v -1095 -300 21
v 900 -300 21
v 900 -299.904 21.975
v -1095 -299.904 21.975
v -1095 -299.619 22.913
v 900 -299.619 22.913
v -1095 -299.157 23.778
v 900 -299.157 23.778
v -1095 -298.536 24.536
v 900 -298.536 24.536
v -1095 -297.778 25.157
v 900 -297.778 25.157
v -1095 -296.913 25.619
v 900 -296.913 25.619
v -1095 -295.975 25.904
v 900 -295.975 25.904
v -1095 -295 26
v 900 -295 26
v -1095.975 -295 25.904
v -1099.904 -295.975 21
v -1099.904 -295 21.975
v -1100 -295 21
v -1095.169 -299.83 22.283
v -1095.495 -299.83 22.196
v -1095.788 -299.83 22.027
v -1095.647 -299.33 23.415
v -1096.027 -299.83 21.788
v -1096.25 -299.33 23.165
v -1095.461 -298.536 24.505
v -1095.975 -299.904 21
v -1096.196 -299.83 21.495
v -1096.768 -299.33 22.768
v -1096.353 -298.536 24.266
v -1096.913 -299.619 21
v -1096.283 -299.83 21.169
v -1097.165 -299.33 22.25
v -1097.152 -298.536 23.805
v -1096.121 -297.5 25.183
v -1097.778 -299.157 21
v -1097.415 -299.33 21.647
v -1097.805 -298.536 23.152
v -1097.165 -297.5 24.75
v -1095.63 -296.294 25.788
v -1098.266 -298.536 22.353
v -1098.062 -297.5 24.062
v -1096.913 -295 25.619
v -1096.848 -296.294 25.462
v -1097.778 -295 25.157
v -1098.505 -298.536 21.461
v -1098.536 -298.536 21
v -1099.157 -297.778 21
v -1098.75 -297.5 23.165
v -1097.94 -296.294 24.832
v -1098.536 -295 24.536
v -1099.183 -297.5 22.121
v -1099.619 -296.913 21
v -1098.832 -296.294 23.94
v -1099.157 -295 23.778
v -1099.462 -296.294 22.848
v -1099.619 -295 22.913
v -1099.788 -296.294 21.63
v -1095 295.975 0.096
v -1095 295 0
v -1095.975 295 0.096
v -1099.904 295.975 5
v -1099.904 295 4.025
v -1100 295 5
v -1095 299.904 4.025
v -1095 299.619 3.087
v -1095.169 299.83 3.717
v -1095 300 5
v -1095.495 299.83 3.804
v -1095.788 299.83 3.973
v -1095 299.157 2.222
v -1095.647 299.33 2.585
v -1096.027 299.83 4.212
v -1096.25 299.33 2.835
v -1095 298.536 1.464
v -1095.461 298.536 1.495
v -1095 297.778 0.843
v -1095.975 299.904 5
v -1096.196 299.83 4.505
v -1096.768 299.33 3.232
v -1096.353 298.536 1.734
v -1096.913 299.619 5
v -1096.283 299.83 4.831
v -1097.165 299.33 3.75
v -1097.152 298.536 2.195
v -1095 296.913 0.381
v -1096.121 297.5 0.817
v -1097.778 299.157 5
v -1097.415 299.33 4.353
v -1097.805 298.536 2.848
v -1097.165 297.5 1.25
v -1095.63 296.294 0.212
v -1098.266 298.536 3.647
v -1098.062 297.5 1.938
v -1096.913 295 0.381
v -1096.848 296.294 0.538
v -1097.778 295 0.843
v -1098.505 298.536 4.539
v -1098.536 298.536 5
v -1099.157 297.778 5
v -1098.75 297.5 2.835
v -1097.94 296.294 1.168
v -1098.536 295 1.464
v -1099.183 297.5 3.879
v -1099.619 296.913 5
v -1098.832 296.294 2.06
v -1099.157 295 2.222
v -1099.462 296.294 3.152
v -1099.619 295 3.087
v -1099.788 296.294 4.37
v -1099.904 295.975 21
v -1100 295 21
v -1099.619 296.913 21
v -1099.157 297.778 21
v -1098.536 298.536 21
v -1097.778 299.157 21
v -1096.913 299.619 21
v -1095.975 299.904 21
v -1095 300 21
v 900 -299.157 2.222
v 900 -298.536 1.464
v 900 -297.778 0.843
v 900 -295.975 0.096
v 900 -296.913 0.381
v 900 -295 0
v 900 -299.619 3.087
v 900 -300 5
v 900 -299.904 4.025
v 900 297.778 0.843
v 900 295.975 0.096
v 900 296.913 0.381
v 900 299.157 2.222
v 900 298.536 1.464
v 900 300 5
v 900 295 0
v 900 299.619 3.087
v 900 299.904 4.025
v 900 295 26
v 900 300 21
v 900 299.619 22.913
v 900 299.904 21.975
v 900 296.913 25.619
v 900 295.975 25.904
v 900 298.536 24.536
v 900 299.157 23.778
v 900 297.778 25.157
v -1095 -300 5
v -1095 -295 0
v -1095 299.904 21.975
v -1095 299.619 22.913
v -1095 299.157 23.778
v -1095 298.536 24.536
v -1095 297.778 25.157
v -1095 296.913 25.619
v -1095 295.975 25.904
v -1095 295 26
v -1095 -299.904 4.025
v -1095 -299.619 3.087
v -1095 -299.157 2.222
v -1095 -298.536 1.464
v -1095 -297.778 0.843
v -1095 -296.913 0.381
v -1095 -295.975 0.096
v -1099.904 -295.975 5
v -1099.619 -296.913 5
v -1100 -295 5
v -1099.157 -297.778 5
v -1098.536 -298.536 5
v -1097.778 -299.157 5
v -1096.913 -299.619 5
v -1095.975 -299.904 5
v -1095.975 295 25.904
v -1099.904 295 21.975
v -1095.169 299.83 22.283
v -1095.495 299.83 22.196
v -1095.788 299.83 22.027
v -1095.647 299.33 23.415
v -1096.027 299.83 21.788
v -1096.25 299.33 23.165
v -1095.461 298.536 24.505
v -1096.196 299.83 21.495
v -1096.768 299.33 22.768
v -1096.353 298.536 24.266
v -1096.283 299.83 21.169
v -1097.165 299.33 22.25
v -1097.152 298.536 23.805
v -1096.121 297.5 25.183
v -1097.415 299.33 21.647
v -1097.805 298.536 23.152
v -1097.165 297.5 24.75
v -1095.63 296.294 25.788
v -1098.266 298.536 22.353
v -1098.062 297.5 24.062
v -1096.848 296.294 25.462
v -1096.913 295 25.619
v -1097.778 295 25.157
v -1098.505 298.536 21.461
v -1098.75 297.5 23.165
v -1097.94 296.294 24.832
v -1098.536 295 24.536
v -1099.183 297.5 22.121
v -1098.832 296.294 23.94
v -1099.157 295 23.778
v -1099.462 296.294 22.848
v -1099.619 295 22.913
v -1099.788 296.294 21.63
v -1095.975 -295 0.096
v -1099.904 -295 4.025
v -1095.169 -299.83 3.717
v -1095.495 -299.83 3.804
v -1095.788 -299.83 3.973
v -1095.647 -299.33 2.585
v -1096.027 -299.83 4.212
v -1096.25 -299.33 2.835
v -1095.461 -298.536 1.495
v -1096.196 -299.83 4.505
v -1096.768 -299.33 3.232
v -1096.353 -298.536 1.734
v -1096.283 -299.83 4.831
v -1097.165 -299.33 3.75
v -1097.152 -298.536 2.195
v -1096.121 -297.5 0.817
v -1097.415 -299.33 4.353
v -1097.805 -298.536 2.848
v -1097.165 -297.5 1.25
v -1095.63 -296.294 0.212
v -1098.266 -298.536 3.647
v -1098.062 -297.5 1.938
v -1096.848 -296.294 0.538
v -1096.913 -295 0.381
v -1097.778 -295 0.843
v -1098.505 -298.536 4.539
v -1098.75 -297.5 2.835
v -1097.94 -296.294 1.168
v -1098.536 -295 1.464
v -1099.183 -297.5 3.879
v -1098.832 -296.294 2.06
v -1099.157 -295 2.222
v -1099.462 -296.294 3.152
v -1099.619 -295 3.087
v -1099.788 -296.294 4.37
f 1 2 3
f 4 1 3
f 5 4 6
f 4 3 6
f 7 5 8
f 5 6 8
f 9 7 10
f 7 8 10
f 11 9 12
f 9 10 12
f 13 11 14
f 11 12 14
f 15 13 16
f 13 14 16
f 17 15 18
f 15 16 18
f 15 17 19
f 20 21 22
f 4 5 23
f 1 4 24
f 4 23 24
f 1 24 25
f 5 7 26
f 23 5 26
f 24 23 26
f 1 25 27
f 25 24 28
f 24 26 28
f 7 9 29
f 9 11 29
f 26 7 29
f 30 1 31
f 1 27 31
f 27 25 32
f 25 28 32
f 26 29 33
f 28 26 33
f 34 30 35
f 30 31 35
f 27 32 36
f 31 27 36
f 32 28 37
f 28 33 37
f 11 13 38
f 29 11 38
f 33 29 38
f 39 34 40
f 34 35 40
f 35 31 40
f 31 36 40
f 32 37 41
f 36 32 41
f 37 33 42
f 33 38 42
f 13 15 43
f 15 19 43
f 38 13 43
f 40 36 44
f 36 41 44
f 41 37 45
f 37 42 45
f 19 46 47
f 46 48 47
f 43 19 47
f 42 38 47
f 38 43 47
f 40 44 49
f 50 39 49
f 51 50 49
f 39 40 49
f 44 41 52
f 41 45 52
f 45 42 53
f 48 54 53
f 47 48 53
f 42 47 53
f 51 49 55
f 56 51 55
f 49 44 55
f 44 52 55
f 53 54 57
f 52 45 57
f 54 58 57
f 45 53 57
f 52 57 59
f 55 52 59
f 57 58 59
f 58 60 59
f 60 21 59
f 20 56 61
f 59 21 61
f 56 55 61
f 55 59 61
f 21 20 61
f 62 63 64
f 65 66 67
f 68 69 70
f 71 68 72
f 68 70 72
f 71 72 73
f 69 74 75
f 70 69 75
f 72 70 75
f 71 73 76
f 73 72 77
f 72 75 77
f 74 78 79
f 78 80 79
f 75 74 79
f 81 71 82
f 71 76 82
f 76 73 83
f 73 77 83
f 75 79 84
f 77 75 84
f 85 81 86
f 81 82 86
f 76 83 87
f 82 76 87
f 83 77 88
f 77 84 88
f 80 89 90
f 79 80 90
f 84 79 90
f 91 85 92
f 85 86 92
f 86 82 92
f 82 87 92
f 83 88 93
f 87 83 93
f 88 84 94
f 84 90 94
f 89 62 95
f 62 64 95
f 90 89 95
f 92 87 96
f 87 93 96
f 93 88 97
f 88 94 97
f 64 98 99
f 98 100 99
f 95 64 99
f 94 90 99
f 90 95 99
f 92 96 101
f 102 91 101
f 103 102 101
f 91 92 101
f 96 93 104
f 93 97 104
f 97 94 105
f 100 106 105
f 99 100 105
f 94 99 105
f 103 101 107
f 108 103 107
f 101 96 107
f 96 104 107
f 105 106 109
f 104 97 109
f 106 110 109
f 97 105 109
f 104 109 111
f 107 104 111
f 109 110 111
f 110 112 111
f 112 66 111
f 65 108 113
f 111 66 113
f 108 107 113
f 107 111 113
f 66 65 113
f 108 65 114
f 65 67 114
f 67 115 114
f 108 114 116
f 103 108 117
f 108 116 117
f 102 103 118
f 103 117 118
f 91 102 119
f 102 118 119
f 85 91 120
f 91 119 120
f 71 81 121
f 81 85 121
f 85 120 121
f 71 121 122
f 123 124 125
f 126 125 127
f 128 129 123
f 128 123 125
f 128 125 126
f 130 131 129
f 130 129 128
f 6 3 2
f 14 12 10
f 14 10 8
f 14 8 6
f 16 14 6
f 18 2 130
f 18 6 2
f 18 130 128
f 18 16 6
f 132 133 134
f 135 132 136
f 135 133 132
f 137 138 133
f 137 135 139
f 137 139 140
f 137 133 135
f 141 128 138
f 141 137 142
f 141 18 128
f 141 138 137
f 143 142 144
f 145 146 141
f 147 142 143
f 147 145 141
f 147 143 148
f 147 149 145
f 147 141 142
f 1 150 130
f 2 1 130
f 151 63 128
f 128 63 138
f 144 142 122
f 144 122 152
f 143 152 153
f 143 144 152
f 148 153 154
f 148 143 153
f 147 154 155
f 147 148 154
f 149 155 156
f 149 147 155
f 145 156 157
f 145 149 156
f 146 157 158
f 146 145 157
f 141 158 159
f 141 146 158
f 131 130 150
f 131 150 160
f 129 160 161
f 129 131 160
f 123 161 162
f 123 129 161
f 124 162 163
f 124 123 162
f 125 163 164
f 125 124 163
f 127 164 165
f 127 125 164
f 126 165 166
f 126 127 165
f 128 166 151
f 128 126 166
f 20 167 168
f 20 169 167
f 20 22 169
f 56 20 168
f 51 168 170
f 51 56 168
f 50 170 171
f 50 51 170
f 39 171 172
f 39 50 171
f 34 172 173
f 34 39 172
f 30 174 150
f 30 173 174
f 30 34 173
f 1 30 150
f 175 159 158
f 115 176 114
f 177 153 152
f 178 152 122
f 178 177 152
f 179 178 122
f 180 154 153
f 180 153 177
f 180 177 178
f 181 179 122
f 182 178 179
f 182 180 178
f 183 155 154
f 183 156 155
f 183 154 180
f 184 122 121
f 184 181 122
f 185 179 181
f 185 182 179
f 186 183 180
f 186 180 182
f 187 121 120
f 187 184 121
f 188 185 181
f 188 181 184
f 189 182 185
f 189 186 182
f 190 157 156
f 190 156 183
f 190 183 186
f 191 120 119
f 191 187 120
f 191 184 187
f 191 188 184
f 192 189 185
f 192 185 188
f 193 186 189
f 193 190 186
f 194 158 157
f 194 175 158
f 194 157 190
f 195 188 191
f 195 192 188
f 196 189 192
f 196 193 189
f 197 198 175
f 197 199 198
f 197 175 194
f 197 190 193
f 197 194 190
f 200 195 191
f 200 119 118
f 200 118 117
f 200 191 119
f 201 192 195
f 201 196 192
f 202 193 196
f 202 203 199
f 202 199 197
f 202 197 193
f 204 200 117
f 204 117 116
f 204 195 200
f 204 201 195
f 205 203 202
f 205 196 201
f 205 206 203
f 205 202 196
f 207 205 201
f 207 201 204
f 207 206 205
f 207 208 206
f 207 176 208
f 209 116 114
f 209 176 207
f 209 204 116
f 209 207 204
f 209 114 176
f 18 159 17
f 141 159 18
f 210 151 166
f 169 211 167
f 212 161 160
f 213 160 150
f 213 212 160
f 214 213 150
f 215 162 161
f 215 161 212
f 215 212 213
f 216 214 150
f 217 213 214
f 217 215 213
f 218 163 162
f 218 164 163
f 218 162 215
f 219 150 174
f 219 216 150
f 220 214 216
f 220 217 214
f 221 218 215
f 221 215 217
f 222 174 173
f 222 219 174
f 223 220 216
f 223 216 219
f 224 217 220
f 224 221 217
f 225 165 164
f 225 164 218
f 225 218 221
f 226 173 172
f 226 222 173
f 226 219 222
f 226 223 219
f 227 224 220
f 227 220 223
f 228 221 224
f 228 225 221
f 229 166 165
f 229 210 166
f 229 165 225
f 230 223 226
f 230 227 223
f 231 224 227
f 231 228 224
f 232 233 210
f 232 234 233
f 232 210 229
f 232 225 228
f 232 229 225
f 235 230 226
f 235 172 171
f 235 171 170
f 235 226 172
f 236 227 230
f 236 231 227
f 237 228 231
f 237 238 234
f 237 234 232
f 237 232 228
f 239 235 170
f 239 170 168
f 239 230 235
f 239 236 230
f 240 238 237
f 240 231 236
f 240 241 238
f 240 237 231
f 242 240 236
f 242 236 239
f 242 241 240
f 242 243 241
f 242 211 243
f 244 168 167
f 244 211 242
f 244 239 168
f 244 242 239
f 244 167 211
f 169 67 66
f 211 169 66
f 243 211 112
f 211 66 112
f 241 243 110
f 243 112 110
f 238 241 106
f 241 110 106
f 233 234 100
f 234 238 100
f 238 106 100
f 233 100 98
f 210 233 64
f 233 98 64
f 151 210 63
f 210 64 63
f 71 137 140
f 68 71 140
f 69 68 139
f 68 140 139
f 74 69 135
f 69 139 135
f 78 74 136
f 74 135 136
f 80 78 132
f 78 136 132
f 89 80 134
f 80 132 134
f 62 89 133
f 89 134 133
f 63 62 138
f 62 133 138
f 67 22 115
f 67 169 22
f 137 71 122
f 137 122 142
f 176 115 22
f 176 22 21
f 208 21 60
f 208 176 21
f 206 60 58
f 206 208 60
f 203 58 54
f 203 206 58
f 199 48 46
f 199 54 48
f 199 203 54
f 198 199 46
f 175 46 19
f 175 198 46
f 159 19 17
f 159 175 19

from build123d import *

# Parameters (mm, degrees)
F0_W     = 2200
F0_H     = 600
F1_DEPTH = 26
F2_R     = 5
F3_W     = 600
F3_H     = 26
F4_DEPTH = 200


with BuildPart() as f1:
    # F0 (on Top) → F1 (new body)
    with BuildSketch(Plane.XY):
        Rectangle(F0_W, F0_H)
    extrude(amount=F1_DEPTH)

    # F2
    f2_edges = [f1.edges().sort_by_distance(p)[0] for p in [
        (-1100, 0, 26),
        (0, -300, 26),
        (1100, 0, 26),
        (0, 300, 26),
        (-1100, 0, 0),
        (0, -300, 0),
        (1100, 0, 0),
        (0, 300, 0),
        (-1100, -300, 13),
        (-1100, 300, 13),
        (1100, 300, 13),
        (1100, -300, 13),
    ]]
    fillet(f2_edges, radius=F2_R)

    # F3 (on face) → F4 (cut)
    with BuildSketch(Plane.YZ.offset(1100)):
        with Locations((0, 13)):
            Rectangle(F3_W, F3_H)
    extrude(amount=-F4_DEPTH, mode=Mode.SUBTRACT)


solid = f1.part
